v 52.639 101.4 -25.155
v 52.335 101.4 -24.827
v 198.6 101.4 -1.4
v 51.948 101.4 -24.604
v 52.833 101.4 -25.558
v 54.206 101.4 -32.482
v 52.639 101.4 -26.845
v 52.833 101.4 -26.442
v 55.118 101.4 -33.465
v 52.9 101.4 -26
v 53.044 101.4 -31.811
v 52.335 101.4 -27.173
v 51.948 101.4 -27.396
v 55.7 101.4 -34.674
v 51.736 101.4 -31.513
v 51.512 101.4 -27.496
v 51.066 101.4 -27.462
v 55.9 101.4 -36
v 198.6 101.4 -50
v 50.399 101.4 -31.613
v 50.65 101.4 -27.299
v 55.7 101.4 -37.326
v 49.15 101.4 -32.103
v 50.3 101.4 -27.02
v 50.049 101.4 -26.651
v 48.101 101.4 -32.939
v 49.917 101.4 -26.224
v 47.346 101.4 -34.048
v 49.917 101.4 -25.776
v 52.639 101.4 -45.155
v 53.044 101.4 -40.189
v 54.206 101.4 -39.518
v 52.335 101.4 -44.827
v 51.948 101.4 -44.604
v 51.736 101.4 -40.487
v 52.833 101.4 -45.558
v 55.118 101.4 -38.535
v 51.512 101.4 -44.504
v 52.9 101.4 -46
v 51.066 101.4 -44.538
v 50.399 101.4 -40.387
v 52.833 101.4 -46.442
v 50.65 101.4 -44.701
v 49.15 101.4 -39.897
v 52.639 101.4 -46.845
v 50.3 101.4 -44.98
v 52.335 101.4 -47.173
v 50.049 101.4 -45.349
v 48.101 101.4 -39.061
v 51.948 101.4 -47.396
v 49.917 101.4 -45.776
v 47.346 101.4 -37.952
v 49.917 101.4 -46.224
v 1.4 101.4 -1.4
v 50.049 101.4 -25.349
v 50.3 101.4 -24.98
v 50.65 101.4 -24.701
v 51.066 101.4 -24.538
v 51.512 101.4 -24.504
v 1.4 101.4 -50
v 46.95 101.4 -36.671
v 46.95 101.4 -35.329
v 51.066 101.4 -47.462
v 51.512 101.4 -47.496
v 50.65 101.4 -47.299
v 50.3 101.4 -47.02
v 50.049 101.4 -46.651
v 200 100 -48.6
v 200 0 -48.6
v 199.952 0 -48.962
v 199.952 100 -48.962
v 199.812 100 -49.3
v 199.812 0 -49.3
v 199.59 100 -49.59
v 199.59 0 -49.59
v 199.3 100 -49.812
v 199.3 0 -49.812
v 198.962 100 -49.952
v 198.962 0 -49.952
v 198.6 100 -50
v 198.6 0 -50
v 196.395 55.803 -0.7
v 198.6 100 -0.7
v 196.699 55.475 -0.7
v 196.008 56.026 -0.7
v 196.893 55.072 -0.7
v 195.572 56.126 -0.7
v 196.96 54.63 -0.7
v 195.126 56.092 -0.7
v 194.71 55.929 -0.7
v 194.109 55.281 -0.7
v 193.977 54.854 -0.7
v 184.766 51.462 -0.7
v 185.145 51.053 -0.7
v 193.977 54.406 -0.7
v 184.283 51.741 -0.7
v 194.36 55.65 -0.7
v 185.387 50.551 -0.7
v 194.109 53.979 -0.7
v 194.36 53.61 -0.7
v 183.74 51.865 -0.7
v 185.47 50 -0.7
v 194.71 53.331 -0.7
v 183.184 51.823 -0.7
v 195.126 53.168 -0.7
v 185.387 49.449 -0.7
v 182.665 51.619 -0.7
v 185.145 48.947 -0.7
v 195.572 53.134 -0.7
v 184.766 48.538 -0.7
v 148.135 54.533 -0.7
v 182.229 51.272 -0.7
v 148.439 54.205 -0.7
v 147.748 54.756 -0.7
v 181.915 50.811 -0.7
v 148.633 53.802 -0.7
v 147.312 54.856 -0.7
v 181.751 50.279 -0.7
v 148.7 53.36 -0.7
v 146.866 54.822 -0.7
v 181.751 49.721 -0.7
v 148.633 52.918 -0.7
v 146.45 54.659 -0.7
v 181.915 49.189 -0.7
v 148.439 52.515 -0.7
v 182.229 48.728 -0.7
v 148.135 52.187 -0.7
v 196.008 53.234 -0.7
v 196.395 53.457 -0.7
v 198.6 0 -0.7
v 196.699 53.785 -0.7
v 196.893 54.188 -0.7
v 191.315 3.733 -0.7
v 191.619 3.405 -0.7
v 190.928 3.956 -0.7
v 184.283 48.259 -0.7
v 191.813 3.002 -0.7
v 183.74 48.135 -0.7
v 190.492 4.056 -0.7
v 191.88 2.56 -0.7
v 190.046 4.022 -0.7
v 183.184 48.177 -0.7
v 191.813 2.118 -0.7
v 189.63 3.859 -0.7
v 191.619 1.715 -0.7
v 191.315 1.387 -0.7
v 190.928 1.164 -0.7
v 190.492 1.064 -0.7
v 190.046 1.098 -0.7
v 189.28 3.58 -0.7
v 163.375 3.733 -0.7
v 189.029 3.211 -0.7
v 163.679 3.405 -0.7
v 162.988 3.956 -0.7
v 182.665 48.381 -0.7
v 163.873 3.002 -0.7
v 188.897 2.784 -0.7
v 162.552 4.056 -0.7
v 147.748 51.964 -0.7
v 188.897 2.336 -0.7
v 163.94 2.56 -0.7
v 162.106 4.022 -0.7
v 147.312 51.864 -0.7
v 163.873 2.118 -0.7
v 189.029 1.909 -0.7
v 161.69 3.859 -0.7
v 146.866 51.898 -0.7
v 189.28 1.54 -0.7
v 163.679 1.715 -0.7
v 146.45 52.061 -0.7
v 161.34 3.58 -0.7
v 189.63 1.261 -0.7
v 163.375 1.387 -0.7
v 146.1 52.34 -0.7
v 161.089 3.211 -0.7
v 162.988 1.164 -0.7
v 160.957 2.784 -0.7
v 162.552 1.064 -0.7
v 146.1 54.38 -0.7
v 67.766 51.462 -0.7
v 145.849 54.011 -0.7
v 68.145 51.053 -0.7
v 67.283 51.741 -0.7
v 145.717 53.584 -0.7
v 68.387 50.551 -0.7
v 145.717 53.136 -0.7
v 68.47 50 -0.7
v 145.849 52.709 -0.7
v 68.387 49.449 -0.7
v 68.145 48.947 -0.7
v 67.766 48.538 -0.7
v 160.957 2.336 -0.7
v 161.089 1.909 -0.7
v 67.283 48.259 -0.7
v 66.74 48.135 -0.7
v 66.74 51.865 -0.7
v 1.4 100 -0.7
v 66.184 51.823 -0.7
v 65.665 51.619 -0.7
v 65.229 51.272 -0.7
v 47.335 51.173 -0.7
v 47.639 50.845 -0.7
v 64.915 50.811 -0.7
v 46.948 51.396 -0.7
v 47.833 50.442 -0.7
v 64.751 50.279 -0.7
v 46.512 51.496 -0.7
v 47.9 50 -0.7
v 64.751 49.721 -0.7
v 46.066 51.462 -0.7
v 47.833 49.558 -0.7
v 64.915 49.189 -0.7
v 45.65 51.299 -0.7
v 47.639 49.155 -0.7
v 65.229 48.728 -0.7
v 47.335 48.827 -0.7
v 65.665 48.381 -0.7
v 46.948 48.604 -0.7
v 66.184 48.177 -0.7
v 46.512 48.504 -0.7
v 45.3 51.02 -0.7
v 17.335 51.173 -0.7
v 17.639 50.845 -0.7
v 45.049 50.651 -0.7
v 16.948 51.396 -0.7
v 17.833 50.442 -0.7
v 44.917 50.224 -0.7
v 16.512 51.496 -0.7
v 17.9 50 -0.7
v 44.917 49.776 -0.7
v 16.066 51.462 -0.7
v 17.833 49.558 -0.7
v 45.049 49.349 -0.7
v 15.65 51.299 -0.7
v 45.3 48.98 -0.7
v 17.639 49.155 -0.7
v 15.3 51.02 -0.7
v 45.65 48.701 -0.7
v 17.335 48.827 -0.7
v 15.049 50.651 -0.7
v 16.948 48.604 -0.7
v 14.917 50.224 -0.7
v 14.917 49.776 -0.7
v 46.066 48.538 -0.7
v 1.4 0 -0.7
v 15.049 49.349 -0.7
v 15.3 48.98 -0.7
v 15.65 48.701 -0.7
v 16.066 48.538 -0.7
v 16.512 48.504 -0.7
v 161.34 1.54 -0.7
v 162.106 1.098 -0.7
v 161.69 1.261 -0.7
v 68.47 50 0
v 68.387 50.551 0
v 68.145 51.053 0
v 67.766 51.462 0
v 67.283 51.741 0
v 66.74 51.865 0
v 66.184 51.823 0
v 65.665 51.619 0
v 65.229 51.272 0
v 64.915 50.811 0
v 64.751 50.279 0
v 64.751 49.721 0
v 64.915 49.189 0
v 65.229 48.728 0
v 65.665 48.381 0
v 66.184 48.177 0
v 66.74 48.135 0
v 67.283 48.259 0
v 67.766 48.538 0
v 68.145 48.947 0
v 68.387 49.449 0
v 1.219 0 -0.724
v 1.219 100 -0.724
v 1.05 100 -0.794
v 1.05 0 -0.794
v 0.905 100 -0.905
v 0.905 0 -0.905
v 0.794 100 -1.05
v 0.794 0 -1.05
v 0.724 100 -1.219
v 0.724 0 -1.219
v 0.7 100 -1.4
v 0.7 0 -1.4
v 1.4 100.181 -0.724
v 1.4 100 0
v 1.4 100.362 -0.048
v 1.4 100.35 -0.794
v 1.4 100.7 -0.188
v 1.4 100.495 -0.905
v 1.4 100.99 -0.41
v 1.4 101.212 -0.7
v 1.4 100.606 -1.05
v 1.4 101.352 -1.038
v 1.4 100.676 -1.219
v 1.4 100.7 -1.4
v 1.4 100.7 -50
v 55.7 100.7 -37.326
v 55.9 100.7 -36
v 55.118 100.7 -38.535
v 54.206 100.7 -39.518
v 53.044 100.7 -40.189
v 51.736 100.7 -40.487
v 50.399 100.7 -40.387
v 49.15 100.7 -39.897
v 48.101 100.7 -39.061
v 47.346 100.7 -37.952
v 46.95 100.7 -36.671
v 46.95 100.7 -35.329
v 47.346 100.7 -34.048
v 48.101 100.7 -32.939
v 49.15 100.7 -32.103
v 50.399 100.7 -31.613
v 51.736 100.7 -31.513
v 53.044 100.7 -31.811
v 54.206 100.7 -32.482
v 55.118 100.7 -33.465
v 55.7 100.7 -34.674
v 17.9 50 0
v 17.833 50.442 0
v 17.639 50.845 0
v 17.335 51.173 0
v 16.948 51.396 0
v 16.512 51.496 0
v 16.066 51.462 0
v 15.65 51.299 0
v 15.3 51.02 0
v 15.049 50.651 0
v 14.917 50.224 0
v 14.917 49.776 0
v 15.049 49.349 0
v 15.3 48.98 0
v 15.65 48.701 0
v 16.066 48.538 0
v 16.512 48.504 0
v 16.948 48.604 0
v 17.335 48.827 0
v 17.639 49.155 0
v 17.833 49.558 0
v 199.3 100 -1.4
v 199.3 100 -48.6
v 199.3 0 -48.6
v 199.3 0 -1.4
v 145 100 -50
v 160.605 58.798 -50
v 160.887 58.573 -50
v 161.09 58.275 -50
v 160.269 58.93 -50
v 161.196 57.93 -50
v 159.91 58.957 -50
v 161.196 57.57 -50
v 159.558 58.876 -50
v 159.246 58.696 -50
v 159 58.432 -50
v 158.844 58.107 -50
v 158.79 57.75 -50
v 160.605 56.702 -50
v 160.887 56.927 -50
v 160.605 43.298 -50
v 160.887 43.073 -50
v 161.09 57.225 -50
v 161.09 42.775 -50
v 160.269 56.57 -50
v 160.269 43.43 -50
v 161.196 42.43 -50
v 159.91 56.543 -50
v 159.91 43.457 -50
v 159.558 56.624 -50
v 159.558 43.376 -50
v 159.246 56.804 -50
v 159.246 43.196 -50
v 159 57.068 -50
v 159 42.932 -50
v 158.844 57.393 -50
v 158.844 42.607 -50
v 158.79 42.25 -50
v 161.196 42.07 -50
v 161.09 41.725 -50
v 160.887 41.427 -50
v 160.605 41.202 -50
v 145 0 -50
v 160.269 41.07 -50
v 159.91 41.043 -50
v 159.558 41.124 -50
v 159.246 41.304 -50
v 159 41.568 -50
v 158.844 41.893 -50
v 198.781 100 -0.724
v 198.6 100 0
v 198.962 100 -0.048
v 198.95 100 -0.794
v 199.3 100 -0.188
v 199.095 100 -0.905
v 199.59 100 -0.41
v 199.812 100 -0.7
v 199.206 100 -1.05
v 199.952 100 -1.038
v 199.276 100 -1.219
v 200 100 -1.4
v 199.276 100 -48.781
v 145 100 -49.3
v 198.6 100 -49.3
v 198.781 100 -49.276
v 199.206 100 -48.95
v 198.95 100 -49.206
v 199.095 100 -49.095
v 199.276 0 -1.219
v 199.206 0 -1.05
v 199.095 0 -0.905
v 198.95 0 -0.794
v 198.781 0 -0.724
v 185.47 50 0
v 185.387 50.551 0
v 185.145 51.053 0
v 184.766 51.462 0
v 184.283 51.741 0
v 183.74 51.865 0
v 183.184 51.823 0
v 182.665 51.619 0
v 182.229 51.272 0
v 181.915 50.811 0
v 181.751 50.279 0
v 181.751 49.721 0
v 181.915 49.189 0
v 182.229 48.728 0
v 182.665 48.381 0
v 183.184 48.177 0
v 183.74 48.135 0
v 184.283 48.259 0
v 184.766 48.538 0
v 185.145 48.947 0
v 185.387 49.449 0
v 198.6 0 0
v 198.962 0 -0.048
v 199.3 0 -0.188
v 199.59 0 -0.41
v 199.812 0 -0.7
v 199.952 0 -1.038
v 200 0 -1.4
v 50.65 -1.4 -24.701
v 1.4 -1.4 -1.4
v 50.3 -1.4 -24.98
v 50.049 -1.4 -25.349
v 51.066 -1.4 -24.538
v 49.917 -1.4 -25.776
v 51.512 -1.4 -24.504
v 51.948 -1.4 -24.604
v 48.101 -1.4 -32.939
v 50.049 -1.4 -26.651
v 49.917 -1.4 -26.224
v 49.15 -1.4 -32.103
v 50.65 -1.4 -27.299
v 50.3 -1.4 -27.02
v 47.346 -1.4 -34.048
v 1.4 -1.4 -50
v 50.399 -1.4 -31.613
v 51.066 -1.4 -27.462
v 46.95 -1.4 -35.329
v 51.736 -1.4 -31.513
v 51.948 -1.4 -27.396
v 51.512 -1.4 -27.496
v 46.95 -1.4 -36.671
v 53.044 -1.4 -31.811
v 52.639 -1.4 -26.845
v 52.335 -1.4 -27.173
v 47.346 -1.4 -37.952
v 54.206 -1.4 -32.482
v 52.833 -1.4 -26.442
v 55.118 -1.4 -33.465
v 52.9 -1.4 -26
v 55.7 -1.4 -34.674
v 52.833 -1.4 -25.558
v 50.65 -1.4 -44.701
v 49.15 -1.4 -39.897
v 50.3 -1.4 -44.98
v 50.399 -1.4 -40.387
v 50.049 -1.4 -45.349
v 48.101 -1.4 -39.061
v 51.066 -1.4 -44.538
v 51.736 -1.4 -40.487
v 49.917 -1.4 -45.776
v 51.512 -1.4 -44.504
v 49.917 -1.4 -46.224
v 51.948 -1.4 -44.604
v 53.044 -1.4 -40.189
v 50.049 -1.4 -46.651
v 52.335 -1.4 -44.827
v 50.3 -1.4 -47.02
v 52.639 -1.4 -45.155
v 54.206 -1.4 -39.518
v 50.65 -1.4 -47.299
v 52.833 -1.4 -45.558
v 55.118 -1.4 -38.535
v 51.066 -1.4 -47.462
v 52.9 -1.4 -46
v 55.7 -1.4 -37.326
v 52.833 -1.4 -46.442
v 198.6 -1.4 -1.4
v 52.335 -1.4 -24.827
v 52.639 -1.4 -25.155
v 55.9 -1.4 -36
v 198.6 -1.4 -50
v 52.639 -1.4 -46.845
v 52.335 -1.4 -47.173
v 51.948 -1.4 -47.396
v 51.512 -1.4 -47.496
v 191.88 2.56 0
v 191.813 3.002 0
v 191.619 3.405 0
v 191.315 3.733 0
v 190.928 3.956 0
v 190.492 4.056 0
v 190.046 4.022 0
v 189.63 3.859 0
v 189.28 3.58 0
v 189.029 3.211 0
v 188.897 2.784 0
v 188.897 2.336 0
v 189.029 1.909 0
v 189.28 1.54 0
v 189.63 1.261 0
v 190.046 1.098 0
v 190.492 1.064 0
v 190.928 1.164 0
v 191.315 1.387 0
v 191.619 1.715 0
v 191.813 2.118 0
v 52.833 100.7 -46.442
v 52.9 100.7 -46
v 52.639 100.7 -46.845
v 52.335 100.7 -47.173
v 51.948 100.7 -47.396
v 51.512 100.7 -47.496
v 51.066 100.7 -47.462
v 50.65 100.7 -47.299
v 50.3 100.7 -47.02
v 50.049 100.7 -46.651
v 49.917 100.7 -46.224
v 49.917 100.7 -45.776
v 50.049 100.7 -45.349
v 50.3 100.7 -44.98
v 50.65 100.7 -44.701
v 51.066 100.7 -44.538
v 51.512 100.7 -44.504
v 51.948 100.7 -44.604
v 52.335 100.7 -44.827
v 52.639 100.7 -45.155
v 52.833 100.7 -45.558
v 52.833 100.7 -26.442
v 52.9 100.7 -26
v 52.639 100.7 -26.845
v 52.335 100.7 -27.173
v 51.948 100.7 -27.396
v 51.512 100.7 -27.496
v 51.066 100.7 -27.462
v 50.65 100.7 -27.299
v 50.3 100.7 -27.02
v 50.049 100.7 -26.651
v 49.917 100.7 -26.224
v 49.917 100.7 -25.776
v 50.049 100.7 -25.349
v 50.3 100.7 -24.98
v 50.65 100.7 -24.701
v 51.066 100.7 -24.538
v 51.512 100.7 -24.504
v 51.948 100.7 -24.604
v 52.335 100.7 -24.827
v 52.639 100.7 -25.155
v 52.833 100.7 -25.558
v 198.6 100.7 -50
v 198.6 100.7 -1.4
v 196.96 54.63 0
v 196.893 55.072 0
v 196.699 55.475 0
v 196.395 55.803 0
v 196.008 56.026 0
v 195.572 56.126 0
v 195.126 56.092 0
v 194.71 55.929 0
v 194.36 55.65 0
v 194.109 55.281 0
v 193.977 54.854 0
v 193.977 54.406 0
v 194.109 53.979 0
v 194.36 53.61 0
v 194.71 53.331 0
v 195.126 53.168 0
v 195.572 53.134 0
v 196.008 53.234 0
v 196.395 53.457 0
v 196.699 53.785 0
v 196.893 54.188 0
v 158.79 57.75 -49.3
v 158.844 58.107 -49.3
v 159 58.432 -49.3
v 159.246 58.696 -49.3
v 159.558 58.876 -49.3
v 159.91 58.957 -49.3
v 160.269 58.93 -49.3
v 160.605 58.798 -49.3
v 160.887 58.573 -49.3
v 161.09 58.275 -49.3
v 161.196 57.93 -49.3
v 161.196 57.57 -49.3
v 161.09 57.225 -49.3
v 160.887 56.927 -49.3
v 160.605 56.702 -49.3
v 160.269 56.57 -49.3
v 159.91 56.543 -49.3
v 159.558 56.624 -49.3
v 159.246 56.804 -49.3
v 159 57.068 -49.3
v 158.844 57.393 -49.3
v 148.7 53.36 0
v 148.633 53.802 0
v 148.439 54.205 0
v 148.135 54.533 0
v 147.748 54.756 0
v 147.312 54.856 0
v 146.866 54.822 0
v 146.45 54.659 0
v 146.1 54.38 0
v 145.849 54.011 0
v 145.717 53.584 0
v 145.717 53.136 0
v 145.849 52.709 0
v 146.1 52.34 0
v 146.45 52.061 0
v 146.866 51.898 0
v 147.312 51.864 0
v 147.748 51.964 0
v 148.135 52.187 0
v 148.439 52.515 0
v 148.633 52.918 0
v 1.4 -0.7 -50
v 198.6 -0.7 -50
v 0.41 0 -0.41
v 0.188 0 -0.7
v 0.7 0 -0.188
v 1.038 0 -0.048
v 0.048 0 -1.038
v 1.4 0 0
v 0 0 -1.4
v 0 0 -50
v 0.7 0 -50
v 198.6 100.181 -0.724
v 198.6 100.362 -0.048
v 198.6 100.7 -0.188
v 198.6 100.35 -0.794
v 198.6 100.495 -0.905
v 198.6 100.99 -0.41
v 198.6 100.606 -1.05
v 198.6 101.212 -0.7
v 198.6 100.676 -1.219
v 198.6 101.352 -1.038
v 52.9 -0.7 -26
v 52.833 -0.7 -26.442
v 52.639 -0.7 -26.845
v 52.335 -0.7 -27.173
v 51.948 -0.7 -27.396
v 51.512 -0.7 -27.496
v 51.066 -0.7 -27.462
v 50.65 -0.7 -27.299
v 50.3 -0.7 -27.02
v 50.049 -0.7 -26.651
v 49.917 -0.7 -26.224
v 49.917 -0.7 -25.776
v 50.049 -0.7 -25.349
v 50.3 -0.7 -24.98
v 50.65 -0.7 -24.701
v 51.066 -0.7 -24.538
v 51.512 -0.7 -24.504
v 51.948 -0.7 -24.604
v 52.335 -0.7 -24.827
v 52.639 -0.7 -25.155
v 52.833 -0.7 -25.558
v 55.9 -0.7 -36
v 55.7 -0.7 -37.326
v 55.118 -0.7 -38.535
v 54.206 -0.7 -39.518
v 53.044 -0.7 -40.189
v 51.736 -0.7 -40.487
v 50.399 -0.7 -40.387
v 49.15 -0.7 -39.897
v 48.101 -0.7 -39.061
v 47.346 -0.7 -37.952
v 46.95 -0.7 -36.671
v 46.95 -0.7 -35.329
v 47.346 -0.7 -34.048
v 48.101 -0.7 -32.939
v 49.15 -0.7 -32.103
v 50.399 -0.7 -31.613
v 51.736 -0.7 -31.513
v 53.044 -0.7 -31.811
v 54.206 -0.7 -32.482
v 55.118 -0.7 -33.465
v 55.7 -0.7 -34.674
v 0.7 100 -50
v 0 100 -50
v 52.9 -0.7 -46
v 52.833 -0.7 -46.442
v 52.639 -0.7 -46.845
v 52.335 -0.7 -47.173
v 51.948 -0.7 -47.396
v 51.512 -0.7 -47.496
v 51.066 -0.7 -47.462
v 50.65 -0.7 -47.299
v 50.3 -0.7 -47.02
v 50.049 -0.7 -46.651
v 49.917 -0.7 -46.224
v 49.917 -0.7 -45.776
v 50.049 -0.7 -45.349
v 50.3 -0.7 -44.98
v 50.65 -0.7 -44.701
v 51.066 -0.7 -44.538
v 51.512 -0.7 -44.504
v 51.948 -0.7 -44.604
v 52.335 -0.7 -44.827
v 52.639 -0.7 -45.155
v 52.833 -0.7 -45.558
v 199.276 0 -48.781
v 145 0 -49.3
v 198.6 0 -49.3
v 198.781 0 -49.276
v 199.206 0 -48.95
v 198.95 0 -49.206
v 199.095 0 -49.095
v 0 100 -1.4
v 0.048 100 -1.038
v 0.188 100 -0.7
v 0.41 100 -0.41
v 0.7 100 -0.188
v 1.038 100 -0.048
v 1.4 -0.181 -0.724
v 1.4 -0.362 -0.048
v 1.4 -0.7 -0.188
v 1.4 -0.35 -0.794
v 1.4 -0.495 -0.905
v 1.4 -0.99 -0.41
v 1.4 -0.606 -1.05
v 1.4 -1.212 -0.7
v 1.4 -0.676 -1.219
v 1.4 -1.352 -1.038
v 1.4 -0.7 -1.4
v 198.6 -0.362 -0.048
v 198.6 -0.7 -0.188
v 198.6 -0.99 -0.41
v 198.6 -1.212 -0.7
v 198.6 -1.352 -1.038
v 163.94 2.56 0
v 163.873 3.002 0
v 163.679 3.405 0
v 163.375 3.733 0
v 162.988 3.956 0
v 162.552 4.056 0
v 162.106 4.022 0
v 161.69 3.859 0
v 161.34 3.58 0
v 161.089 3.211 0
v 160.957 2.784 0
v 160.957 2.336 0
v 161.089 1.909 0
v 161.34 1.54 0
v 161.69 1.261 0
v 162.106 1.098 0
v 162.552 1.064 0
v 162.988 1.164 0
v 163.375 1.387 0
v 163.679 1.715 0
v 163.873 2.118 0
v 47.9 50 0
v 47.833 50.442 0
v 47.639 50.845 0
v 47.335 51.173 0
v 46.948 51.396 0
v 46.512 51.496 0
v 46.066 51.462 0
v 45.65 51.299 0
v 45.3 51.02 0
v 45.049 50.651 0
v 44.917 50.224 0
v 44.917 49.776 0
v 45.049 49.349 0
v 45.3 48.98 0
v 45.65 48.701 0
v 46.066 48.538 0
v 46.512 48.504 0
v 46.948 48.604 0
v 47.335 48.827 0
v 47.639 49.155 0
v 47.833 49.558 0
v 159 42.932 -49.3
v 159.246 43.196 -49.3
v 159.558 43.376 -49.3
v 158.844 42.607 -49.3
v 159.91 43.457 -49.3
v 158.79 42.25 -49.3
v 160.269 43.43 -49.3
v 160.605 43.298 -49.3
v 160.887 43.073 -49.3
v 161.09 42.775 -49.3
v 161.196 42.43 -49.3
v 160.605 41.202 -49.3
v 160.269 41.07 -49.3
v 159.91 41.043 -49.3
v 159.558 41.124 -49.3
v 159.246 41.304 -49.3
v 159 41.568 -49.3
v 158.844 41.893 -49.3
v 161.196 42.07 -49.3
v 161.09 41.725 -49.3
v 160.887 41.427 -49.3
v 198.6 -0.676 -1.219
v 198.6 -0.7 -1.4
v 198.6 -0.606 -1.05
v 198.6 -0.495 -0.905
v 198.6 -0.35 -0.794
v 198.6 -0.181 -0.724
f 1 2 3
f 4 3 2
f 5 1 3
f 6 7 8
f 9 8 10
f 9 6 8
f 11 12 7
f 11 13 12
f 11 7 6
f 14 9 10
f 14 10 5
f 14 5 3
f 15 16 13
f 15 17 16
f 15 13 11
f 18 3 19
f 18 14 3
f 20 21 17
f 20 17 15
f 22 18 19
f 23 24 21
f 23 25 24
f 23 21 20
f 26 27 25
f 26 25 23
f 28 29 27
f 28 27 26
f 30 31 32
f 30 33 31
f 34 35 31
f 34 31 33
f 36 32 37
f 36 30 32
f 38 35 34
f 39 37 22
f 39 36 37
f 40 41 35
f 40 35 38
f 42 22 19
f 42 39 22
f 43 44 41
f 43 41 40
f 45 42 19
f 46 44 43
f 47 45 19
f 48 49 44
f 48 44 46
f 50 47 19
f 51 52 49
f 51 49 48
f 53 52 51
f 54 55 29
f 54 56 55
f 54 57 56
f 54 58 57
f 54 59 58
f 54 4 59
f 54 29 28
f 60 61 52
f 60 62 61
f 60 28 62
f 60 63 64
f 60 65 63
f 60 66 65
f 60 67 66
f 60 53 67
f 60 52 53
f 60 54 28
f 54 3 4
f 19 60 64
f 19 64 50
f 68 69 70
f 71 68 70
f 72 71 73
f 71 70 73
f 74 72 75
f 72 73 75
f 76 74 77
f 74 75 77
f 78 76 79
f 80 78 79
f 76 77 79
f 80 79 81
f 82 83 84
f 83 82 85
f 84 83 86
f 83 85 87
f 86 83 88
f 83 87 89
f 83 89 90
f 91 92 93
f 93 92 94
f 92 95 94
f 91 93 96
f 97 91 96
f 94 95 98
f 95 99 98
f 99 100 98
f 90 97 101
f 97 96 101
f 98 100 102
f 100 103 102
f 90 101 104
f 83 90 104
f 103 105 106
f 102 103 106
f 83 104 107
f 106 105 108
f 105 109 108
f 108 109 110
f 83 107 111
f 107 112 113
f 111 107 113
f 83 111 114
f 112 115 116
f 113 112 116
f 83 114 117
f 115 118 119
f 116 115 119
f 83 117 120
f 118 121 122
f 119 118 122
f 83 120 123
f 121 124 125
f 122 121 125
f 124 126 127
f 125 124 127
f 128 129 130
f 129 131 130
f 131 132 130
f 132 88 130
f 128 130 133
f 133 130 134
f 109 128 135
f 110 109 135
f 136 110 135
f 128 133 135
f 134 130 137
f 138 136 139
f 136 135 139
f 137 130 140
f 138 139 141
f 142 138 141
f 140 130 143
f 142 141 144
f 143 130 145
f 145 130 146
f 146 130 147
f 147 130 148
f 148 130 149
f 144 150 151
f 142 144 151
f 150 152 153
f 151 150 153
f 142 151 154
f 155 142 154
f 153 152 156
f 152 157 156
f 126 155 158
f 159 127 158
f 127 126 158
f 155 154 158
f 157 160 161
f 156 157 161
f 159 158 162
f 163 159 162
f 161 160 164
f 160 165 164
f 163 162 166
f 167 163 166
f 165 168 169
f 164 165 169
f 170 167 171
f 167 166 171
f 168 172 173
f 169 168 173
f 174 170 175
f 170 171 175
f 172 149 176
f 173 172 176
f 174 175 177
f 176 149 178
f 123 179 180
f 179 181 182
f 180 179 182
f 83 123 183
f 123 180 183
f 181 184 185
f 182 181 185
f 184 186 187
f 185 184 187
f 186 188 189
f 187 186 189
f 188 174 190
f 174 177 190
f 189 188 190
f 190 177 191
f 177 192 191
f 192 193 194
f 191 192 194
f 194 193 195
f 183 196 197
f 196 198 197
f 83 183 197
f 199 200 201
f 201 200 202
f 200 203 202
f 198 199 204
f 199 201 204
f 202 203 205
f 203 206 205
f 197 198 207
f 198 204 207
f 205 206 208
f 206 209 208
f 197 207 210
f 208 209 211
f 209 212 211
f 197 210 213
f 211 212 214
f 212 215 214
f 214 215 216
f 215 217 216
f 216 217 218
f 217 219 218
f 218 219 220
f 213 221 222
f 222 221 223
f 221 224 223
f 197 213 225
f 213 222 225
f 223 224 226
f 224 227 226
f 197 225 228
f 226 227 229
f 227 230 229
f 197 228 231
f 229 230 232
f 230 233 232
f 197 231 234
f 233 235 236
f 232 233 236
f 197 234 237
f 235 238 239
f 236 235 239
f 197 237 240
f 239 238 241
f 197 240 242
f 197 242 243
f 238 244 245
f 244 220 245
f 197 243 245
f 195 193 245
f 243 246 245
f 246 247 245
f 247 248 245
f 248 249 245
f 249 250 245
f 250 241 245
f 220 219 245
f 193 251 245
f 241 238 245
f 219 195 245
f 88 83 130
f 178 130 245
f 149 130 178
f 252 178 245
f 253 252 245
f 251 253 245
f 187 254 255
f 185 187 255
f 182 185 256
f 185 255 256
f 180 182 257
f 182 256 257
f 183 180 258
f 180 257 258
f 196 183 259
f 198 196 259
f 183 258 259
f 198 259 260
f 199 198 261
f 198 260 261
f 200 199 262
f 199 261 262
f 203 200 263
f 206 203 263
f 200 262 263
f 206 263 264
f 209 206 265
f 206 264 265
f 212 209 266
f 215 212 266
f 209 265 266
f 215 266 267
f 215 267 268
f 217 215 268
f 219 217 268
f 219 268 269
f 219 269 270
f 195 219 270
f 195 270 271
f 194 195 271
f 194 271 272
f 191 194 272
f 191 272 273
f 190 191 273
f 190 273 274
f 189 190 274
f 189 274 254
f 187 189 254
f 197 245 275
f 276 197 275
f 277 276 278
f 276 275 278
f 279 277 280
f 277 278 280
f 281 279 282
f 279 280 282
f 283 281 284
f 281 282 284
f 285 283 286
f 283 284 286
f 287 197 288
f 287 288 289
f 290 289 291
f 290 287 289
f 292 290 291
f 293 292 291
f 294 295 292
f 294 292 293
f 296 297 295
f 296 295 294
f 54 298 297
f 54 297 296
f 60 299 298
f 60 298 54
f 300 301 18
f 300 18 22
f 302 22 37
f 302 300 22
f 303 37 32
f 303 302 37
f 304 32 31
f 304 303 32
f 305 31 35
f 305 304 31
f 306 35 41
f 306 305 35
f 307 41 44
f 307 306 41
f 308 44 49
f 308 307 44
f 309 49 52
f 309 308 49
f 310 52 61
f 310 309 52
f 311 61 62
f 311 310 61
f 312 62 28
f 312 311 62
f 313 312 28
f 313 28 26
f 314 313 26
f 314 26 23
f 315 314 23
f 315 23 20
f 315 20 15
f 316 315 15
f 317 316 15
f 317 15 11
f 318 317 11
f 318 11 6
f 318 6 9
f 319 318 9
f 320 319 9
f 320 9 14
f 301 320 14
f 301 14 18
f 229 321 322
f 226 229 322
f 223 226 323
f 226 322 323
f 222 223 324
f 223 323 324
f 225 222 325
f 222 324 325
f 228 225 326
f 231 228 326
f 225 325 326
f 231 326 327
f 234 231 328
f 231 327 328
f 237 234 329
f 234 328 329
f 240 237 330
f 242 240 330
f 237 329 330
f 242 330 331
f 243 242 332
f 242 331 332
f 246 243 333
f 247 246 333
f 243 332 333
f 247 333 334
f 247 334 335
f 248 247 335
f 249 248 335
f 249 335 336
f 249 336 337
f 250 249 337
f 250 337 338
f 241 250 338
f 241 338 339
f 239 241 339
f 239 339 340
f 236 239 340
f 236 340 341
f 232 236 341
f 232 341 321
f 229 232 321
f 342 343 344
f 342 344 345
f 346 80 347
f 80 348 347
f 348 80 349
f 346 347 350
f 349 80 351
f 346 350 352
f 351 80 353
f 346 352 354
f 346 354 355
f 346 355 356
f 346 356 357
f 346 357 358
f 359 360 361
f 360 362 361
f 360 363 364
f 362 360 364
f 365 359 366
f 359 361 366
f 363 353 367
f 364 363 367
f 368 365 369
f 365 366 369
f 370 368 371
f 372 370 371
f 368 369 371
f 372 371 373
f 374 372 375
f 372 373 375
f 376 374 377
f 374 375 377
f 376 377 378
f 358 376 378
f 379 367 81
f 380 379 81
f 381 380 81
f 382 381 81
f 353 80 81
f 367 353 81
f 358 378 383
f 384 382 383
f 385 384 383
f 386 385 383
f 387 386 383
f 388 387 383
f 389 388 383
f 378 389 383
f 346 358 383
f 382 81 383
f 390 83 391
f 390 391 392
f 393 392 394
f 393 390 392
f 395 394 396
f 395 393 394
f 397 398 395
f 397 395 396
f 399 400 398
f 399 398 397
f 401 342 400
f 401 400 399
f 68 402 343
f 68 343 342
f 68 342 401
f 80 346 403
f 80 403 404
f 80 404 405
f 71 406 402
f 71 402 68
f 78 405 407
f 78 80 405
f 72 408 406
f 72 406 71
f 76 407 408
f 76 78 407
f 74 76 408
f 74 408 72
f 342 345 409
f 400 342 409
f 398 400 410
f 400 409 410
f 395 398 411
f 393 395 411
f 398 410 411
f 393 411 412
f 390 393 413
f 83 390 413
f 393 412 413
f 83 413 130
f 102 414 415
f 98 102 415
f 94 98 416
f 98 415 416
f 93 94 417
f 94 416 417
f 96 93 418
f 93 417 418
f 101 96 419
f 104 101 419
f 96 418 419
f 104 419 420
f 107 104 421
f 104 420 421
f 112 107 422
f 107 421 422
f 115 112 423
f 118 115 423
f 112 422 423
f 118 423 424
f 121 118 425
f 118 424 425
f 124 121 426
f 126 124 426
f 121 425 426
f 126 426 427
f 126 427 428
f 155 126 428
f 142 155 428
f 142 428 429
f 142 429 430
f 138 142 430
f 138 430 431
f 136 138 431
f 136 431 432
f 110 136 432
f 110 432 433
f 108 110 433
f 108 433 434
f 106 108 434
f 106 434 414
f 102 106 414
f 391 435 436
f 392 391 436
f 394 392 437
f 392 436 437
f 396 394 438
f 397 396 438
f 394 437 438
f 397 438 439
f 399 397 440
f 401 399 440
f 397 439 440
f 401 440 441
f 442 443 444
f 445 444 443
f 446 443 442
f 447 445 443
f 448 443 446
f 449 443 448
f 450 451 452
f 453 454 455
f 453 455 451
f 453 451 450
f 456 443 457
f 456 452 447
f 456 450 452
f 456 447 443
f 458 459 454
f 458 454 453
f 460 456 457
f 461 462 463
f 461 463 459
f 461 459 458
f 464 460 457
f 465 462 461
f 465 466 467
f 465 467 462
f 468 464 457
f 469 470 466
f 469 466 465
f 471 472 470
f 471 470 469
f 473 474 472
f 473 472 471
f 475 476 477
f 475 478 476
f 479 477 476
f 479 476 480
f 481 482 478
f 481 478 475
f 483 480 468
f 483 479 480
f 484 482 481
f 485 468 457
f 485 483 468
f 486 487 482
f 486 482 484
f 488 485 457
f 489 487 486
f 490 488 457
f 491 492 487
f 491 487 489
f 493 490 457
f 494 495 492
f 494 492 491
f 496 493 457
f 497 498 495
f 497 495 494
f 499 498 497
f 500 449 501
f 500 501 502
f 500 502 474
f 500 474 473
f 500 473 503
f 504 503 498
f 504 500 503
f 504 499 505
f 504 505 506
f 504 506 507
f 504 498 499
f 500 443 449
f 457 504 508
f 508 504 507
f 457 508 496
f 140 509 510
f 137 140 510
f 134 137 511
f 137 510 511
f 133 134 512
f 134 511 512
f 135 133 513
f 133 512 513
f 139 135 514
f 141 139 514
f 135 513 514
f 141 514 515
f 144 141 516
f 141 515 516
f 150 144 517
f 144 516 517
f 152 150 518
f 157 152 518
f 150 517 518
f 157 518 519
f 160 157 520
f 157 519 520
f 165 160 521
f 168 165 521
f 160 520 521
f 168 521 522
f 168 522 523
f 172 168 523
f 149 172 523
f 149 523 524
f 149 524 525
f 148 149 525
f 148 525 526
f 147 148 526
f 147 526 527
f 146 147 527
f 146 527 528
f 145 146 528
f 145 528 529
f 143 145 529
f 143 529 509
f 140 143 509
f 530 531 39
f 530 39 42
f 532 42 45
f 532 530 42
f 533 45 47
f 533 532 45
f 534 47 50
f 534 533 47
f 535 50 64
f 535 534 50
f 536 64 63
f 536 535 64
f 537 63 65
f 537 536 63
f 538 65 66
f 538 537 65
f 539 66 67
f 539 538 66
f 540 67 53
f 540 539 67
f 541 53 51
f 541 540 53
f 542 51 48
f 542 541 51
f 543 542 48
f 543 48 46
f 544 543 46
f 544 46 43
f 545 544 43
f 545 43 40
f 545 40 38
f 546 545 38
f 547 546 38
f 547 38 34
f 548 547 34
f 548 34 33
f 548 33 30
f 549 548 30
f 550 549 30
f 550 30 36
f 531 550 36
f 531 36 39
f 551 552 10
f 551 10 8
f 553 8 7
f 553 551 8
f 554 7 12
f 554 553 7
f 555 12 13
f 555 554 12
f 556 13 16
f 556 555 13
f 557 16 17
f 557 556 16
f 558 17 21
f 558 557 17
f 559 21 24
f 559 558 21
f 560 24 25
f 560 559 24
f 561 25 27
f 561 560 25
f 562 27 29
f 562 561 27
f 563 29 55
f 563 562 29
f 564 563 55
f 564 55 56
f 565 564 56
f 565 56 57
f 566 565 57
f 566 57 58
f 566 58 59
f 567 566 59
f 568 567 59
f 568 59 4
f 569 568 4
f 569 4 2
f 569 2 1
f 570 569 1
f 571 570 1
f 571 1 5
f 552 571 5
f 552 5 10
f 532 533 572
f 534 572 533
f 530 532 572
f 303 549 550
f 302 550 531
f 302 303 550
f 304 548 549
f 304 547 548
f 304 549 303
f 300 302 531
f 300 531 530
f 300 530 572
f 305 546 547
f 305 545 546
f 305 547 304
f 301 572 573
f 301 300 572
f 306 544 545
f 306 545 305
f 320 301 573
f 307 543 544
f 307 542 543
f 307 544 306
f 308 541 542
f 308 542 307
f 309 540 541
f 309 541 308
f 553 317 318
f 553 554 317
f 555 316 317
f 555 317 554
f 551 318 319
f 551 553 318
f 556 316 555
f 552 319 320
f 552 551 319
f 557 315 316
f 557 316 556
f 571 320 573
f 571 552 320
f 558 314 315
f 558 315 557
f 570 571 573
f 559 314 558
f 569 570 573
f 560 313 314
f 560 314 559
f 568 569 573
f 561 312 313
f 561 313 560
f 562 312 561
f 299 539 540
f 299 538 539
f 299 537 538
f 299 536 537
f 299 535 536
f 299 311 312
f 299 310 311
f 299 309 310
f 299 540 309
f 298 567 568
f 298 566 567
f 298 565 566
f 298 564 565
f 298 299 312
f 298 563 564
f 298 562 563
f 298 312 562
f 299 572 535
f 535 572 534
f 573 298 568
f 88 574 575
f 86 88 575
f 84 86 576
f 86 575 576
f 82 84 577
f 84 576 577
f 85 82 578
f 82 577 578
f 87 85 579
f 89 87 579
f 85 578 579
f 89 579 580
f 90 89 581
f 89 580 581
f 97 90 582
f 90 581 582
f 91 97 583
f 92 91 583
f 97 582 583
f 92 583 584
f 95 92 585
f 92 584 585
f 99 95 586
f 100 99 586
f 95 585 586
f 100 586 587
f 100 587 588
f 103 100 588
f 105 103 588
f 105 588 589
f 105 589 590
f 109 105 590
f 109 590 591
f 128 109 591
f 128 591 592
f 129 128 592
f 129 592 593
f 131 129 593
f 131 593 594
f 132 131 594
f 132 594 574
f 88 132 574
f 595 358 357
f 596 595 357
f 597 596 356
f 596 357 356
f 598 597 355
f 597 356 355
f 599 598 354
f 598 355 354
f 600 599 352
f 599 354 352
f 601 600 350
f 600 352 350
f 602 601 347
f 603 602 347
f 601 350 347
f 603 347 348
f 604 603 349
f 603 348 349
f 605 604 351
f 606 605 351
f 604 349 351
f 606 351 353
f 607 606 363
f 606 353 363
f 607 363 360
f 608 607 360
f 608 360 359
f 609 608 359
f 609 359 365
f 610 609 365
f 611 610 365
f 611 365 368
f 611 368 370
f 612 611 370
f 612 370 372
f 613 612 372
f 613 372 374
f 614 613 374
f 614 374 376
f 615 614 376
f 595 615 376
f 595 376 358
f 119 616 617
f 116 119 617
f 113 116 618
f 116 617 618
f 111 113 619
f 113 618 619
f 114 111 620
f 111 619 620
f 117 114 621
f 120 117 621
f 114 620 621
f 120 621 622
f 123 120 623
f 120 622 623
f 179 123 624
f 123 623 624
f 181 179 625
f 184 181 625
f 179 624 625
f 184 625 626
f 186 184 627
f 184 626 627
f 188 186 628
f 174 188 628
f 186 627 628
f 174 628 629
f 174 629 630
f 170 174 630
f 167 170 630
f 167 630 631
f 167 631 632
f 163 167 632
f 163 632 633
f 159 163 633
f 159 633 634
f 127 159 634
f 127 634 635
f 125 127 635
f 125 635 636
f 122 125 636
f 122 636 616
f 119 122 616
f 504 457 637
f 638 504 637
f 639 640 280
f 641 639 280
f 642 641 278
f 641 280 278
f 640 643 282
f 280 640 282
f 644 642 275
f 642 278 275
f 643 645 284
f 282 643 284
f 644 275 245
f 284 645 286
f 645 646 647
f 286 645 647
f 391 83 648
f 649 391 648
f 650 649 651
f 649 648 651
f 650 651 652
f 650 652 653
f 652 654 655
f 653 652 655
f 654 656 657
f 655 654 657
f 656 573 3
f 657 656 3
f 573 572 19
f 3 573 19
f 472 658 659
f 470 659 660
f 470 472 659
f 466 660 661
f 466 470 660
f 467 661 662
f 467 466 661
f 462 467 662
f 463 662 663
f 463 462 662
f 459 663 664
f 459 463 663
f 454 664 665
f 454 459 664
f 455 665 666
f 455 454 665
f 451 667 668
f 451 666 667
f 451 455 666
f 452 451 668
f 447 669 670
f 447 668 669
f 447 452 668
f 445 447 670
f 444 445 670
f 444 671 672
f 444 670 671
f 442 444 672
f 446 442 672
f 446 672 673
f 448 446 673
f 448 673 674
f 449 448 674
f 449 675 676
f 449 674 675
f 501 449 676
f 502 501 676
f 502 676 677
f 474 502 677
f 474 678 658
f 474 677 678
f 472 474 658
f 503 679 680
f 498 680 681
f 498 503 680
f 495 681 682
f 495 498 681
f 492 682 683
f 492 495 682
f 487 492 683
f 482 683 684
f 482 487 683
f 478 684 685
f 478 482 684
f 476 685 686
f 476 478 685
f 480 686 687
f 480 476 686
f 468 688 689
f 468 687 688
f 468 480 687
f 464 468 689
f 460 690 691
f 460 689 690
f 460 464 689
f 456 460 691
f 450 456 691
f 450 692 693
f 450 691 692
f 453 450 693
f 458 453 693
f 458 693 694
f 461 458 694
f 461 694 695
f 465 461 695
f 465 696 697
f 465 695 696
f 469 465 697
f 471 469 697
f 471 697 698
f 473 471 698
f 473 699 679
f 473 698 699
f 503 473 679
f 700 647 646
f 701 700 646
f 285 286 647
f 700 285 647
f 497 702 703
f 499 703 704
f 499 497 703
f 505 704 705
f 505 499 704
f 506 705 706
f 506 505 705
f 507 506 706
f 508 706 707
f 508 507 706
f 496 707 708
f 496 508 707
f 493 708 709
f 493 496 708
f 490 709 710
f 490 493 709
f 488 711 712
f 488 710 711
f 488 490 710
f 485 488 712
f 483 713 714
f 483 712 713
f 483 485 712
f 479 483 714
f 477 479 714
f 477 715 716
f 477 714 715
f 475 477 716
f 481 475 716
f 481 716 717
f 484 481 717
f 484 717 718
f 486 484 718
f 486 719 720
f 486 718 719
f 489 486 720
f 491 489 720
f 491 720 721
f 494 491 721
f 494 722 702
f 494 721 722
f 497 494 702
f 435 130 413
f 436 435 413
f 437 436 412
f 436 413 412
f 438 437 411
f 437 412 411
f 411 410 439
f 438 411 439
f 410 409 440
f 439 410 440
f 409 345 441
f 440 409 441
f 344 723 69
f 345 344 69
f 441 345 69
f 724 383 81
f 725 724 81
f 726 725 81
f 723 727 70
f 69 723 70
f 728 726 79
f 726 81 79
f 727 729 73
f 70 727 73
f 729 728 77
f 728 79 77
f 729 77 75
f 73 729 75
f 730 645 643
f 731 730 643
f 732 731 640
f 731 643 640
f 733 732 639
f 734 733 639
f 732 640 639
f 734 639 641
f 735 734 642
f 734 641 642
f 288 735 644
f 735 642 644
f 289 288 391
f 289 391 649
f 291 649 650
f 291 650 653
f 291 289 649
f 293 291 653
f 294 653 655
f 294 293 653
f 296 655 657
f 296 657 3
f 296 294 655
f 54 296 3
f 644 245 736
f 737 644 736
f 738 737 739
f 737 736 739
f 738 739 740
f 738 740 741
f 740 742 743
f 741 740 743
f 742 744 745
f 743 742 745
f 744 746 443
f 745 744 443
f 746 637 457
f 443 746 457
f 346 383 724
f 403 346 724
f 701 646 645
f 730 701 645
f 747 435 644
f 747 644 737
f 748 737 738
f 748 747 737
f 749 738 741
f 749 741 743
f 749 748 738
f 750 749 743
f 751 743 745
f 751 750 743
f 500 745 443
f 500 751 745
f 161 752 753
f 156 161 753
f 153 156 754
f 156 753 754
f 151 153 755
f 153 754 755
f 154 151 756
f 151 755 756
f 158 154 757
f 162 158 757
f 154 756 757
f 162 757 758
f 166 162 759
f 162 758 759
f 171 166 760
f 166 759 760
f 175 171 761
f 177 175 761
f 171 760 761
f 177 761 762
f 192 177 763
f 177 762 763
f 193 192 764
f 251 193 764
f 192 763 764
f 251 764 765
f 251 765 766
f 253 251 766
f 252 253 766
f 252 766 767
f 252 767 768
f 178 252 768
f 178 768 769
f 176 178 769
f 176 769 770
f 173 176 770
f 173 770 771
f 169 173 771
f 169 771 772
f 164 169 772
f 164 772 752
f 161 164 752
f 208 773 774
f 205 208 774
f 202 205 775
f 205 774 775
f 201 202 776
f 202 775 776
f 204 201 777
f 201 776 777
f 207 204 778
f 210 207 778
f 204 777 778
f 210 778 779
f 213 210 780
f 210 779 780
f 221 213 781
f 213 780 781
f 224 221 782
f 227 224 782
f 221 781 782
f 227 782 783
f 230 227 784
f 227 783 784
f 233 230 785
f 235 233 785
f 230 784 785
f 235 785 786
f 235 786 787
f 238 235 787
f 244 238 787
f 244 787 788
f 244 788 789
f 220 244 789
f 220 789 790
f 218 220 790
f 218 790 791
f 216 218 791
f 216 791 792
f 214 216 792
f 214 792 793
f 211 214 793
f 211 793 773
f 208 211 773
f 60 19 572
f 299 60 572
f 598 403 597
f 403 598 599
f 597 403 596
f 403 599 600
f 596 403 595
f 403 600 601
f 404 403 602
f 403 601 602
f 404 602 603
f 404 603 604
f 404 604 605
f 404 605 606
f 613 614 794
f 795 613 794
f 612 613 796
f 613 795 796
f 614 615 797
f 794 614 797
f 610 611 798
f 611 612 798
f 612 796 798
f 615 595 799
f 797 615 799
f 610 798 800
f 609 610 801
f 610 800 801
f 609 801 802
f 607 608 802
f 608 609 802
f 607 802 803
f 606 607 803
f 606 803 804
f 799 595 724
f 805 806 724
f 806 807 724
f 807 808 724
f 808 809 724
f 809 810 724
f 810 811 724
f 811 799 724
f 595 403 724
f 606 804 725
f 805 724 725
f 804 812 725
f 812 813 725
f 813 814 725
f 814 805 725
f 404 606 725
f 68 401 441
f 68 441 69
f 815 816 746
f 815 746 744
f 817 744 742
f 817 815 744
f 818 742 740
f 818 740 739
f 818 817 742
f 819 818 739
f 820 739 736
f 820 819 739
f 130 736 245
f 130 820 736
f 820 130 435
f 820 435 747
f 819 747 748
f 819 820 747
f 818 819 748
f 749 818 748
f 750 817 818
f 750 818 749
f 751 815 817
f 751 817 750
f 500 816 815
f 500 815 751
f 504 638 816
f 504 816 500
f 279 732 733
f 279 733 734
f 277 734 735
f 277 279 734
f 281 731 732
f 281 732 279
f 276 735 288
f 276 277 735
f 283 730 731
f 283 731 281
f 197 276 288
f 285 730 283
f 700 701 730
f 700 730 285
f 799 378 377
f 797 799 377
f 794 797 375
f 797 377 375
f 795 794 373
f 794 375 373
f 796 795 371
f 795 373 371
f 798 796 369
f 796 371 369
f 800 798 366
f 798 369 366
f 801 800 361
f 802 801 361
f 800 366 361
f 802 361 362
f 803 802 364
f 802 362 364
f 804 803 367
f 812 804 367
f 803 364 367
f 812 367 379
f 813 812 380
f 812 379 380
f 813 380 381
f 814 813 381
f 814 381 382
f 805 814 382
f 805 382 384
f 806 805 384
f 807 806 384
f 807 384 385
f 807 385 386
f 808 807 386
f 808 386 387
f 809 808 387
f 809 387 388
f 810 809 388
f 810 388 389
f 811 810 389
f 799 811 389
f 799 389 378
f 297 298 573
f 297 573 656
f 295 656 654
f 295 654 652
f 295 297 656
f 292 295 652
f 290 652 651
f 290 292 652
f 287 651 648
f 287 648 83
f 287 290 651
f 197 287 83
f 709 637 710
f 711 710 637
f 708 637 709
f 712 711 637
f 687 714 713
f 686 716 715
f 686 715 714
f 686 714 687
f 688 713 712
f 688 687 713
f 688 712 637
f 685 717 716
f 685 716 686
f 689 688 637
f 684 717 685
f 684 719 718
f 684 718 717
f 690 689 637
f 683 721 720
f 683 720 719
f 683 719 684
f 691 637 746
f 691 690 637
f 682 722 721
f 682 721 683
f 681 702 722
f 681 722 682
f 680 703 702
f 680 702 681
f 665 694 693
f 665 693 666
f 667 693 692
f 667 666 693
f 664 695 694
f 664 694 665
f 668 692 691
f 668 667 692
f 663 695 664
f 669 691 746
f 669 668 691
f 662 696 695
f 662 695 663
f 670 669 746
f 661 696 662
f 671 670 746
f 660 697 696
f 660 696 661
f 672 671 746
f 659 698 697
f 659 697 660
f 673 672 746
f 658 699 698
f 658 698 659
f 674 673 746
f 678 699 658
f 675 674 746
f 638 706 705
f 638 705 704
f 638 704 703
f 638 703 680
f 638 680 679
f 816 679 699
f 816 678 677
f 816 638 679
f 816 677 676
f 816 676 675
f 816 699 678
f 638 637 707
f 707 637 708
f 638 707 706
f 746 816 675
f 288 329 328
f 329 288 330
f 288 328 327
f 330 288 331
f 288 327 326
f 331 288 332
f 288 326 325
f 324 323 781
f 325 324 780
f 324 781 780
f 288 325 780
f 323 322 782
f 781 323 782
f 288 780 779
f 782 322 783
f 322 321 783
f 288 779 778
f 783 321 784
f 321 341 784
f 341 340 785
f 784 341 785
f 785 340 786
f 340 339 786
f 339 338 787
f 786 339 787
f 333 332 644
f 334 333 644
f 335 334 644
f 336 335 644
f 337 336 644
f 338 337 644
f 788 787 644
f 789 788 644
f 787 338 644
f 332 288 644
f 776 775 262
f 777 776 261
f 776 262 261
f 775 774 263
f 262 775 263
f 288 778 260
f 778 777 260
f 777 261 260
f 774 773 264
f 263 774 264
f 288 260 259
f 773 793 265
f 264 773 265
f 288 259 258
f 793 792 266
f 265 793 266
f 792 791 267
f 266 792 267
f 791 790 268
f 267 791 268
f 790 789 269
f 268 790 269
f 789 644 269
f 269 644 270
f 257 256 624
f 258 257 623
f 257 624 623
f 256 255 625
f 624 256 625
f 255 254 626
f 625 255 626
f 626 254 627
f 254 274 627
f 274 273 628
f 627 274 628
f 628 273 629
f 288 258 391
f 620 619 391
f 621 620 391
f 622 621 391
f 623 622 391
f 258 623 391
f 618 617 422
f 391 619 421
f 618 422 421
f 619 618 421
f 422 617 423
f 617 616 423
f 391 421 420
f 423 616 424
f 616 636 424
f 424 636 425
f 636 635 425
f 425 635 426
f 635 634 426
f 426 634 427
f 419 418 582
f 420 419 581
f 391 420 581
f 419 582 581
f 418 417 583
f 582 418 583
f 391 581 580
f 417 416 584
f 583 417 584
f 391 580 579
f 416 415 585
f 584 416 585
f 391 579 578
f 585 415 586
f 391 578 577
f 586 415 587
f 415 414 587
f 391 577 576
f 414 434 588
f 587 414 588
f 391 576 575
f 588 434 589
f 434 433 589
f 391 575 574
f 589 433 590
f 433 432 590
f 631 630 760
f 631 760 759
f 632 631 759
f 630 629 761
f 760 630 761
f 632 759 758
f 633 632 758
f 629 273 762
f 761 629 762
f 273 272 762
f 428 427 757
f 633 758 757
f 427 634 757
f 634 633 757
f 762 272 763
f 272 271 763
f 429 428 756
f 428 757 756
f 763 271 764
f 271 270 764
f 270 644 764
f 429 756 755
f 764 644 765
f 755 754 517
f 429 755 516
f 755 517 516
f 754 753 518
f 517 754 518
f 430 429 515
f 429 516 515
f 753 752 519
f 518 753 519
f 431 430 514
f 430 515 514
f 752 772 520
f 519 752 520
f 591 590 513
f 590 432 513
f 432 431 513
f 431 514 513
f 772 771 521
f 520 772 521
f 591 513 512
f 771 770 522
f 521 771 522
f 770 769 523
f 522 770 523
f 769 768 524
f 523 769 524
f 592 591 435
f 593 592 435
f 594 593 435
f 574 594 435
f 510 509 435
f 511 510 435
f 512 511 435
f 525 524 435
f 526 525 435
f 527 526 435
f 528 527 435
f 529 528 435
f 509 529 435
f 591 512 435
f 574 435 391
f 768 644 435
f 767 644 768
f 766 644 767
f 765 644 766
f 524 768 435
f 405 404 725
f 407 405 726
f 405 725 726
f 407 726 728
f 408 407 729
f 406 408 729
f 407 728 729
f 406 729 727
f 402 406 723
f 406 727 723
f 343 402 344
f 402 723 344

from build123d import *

# Parameters (mm, degrees)
BASE_FLANGE1_DEPTH = 100
EDGE_FLANGE1_DEPTH = 197.2
EDGE_FLANGE2_DEPTH = 197.2
HOLE1_START        = -1.4
HOLE1_OUTLINE_R    = 4.5
HOLE1_OUTLINE_R_2  = 1.5
HOLE1_DEPTH        = 102.8
CUT_EXTRUDE2_REACH = 231.743
SKETCH20_R         = 1.21
CUT_EXTRUDE3_REACH = 231.743
SKETCH22_R         = 1.5
SKETCH22_R_2       = 1.87
CUT_EXTRUDE4_REACH = 231.743
SKETCH25_R         = 1.5


# Read off the part's stored shape, not the designer's step: Hole1
# Sheet-metal steps are written as plain solids
with BuildPart() as part:
    # Sketch1 → Base-Flange1 (new body)
    with BuildSketch(Plane(origin=(0, 0, 0), x_dir=(1, 0, 0), z_dir=(0, 1, 0))):
        with BuildLine():
            Line((0, 50), (0, 1.4))
            ThreePointArc((0, 1.4), (0.410050506, 0.410050506), (1.4, 0))
            Line((1.4, 0), (198.6, 0))
            ThreePointArc((198.6, 0), (199.589949494, 0.410050506), (200, 1.4))
            Line((200, 1.4), (200, 48.6))
            ThreePointArc((200, 48.6), (199.589949494, 49.589949494), (198.6, 50))
            Line((198.6, 50), (145, 50))
            Line((145, 50), (145, 49.3))
            Line((145, 49.3), (198.6, 49.3))
            ThreePointArc((198.6, 49.3), (199.094974747, 49.094974747), (199.3, 48.6))
            Line((199.3, 48.6), (199.3, 1.4))
            ThreePointArc((199.3, 1.4), (199.094974747, 0.905025253), (198.6, 0.7))
            Line((198.6, 0.7), (1.4, 0.7))
            ThreePointArc((1.4, 0.7), (0.905025253, 0.905025253), (0.7, 1.4))
            Line((0.7, 1.4), (0.7, 50))
            Line((0.7, 50), (0, 50))
        make_face()
    extrude(amount=BASE_FLANGE1_DEPTH)

    # Edge-Flange1 section (across the edge) → Edge-Flange1 (add)
    with BuildSketch(Plane(origin=(198.6, -0.7, -0.7), x_dir=(0, 1, 0), z_dir=(-1, 0, 0))):
        with BuildLine():
            Line((-0.7, 0.7), (-0.7, 49.3))
            Line((-0.7, 49.3), (0, 49.3))
            Line((0, 49.3), (0, 0.7))
            ThreePointArc((0, 0.7), (0.205025253, 0.205025253), (0.7, 0))
            Line((0.7, 0), (0.7, -0.7))
            ThreePointArc((0.7, -0.7), (-0.289949494, -0.289949494), (-0.7, 0.7))
        make_face()
    extrude(amount=EDGE_FLANGE1_DEPTH)

    # Edge-Flange2 section (across the edge) → Edge-Flange2 (add)
    with BuildSketch(Plane(origin=(1.4, 100.7, -0.7), x_dir=(0, -1, 0), z_dir=(1, 0, 0))):
        with BuildLine():
            Line((-0.7, 0.7), (-0.7, 49.3))
            Line((-0.7, 49.3), (0, 49.3))
            Line((0, 49.3), (0, 0.7))
            ThreePointArc((0, 0.7), (0.205025253, 0.205025253), (0.7, 0))
            Line((0.7, 0), (0.7, -0.7))
            ThreePointArc((0.7, -0.7), (-0.289949494, -0.289949494), (-0.7, 0.7))
        make_face()
    extrude(amount=EDGE_FLANGE2_DEPTH)

    # Hole1 outline → Hole1 (cut)
    with BuildSketch(Plane(origin=(0, 0, 0), x_dir=(1, 0, 0), z_dir=(0, 1, 0)).offset(HOLE1_START)):
        with Locations((51.4, 36)):
            Circle(HOLE1_OUTLINE_R)
        with Locations((51.4, 26)):
            Circle(HOLE1_OUTLINE_R_2)
        with Locations((51.4, 46)):
            Circle(HOLE1_OUTLINE_R_2)
    extrude(amount=HOLE1_DEPTH, mode=Mode.SUBTRACT)

    # Sketch20 → Cut-Extrude2 (cut, up to next)
    with BuildSketch(Plane(origin=(0, 0, -50), x_dir=(-1, 0, 0), z_dir=(0, 0, -1)), mode=Mode.PRIVATE) as cut_extrude2_sk1:
        with Locations((-160, 57.75)):
            Circle(SKETCH20_R)
    cut_extrude2_tool1 = extrude(cut_extrude2_sk1.sketch, amount=-CUT_EXTRUDE2_REACH, mode=Mode.PRIVATE) & part.part
    # Sketch20 → Cut-Extrude2 (cut, up to next)
    with BuildSketch(Plane(origin=(0, 0, -50), x_dir=(-1, 0, 0), z_dir=(0, 0, -1)), mode=Mode.PRIVATE) as cut_extrude2_sk2:
        with Locations((-160, 42.25)):
            Circle(SKETCH20_R)
    cut_extrude2_tool2 = extrude(cut_extrude2_sk2.sketch, amount=-CUT_EXTRUDE2_REACH, mode=Mode.PRIVATE) & part.part
    add(cut_extrude2_tool1.solids().sort_by_distance((160, 57.75, -50))[0], mode=Mode.SUBTRACT)
    add(cut_extrude2_tool2.solids().sort_by_distance((160, 42.25, -50))[0], mode=Mode.SUBTRACT)

    # Sketch22 → Cut-Extrude3 (cut, up to next)
    with BuildSketch(Plane.XY, mode=Mode.PRIVATE) as cut_extrude3_sk1:
        with Locations((16.4, 50)):
            Circle(SKETCH22_R)
    cut_extrude3_tool1 = extrude(cut_extrude3_sk1.sketch, amount=-CUT_EXTRUDE3_REACH, mode=Mode.PRIVATE) & part.part
    # Sketch22 → Cut-Extrude3 (cut, up to next)
    with BuildSketch(Plane.XY, mode=Mode.PRIVATE) as cut_extrude3_sk2:
        with Locations((46.4, 50)):
            Circle(SKETCH22_R)
    cut_extrude3_tool2 = extrude(cut_extrude3_sk2.sketch, amount=-CUT_EXTRUDE3_REACH, mode=Mode.PRIVATE) & part.part
    # Sketch22 → Cut-Extrude3 (cut, up to next)
    with BuildSketch(Plane.XY, mode=Mode.PRIVATE) as cut_extrude3_sk3:
        with Locations((66.6, 50)):
            Circle(SKETCH22_R_2)
    cut_extrude3_tool3 = extrude(cut_extrude3_sk3.sketch, amount=-CUT_EXTRUDE3_REACH, mode=Mode.PRIVATE) & part.part
    # Sketch22 → Cut-Extrude3 (cut, up to next)
    with BuildSketch(Plane.XY, mode=Mode.PRIVATE) as cut_extrude3_sk4:
        with Locations((183.6, 50)):
            Circle(SKETCH22_R_2)
    cut_extrude3_tool4 = extrude(cut_extrude3_sk4.sketch, amount=-CUT_EXTRUDE3_REACH, mode=Mode.PRIVATE) & part.part
    add(cut_extrude3_tool1.solids().sort_by_distance((16.4, 50, 0))[0], mode=Mode.SUBTRACT)
    add(cut_extrude3_tool2.solids().sort_by_distance((46.4, 50, 0))[0], mode=Mode.SUBTRACT)
    add(cut_extrude3_tool3.solids().sort_by_distance((66.6, 50, 0))[0], mode=Mode.SUBTRACT)
    add(cut_extrude3_tool4.solids().sort_by_distance((183.6, 50, 0))[0], mode=Mode.SUBTRACT)

    # Sketch25 → Cut-Extrude4 (cut, up to next)
    with BuildSketch(Plane.XY, mode=Mode.PRIVATE) as cut_extrude4_sk1:
        with Locations((190.38, 2.56)):
            Circle(SKETCH25_R)
    cut_extrude4_tool1 = extrude(cut_extrude4_sk1.sketch, amount=-CUT_EXTRUDE4_REACH, mode=Mode.PRIVATE) & part.part
    # Sketch25 → Cut-Extrude4 (cut, up to next)
    with BuildSketch(Plane.XY, mode=Mode.PRIVATE) as cut_extrude4_sk2:
        with Locations((162.44, 2.56)):
            Circle(SKETCH25_R)
    cut_extrude4_tool2 = extrude(cut_extrude4_sk2.sketch, amount=-CUT_EXTRUDE4_REACH, mode=Mode.PRIVATE) & part.part
    # Sketch25 → Cut-Extrude4 (cut, up to next)
    with BuildSketch(Plane.XY, mode=Mode.PRIVATE) as cut_extrude4_sk3:
        with Locations((195.46, 54.63)):
            Circle(SKETCH25_R)
    cut_extrude4_tool3 = extrude(cut_extrude4_sk3.sketch, amount=-CUT_EXTRUDE4_REACH, mode=Mode.PRIVATE) & part.part
    # Sketch25 → Cut-Extrude4 (cut, up to next)
    with BuildSketch(Plane.XY, mode=Mode.PRIVATE) as cut_extrude4_sk4:
        with Locations((147.2, 53.36)):
            Circle(SKETCH25_R)
    cut_extrude4_tool4 = extrude(cut_extrude4_sk4.sketch, amount=-CUT_EXTRUDE4_REACH, mode=Mode.PRIVATE) & part.part
    add(cut_extrude4_tool1.solids().sort_by_distance((190.38, 2.56, 0))[0], mode=Mode.SUBTRACT)
    add(cut_extrude4_tool2.solids().sort_by_distance((162.44, 2.56, 0))[0], mode=Mode.SUBTRACT)
    add(cut_extrude4_tool3.solids().sort_by_distance((195.46, 54.63, 0))[0], mode=Mode.SUBTRACT)
    add(cut_extrude4_tool4.solids().sort_by_distance((147.2, 53.36, 0))[0], mode=Mode.SUBTRACT)


solid = part.part
